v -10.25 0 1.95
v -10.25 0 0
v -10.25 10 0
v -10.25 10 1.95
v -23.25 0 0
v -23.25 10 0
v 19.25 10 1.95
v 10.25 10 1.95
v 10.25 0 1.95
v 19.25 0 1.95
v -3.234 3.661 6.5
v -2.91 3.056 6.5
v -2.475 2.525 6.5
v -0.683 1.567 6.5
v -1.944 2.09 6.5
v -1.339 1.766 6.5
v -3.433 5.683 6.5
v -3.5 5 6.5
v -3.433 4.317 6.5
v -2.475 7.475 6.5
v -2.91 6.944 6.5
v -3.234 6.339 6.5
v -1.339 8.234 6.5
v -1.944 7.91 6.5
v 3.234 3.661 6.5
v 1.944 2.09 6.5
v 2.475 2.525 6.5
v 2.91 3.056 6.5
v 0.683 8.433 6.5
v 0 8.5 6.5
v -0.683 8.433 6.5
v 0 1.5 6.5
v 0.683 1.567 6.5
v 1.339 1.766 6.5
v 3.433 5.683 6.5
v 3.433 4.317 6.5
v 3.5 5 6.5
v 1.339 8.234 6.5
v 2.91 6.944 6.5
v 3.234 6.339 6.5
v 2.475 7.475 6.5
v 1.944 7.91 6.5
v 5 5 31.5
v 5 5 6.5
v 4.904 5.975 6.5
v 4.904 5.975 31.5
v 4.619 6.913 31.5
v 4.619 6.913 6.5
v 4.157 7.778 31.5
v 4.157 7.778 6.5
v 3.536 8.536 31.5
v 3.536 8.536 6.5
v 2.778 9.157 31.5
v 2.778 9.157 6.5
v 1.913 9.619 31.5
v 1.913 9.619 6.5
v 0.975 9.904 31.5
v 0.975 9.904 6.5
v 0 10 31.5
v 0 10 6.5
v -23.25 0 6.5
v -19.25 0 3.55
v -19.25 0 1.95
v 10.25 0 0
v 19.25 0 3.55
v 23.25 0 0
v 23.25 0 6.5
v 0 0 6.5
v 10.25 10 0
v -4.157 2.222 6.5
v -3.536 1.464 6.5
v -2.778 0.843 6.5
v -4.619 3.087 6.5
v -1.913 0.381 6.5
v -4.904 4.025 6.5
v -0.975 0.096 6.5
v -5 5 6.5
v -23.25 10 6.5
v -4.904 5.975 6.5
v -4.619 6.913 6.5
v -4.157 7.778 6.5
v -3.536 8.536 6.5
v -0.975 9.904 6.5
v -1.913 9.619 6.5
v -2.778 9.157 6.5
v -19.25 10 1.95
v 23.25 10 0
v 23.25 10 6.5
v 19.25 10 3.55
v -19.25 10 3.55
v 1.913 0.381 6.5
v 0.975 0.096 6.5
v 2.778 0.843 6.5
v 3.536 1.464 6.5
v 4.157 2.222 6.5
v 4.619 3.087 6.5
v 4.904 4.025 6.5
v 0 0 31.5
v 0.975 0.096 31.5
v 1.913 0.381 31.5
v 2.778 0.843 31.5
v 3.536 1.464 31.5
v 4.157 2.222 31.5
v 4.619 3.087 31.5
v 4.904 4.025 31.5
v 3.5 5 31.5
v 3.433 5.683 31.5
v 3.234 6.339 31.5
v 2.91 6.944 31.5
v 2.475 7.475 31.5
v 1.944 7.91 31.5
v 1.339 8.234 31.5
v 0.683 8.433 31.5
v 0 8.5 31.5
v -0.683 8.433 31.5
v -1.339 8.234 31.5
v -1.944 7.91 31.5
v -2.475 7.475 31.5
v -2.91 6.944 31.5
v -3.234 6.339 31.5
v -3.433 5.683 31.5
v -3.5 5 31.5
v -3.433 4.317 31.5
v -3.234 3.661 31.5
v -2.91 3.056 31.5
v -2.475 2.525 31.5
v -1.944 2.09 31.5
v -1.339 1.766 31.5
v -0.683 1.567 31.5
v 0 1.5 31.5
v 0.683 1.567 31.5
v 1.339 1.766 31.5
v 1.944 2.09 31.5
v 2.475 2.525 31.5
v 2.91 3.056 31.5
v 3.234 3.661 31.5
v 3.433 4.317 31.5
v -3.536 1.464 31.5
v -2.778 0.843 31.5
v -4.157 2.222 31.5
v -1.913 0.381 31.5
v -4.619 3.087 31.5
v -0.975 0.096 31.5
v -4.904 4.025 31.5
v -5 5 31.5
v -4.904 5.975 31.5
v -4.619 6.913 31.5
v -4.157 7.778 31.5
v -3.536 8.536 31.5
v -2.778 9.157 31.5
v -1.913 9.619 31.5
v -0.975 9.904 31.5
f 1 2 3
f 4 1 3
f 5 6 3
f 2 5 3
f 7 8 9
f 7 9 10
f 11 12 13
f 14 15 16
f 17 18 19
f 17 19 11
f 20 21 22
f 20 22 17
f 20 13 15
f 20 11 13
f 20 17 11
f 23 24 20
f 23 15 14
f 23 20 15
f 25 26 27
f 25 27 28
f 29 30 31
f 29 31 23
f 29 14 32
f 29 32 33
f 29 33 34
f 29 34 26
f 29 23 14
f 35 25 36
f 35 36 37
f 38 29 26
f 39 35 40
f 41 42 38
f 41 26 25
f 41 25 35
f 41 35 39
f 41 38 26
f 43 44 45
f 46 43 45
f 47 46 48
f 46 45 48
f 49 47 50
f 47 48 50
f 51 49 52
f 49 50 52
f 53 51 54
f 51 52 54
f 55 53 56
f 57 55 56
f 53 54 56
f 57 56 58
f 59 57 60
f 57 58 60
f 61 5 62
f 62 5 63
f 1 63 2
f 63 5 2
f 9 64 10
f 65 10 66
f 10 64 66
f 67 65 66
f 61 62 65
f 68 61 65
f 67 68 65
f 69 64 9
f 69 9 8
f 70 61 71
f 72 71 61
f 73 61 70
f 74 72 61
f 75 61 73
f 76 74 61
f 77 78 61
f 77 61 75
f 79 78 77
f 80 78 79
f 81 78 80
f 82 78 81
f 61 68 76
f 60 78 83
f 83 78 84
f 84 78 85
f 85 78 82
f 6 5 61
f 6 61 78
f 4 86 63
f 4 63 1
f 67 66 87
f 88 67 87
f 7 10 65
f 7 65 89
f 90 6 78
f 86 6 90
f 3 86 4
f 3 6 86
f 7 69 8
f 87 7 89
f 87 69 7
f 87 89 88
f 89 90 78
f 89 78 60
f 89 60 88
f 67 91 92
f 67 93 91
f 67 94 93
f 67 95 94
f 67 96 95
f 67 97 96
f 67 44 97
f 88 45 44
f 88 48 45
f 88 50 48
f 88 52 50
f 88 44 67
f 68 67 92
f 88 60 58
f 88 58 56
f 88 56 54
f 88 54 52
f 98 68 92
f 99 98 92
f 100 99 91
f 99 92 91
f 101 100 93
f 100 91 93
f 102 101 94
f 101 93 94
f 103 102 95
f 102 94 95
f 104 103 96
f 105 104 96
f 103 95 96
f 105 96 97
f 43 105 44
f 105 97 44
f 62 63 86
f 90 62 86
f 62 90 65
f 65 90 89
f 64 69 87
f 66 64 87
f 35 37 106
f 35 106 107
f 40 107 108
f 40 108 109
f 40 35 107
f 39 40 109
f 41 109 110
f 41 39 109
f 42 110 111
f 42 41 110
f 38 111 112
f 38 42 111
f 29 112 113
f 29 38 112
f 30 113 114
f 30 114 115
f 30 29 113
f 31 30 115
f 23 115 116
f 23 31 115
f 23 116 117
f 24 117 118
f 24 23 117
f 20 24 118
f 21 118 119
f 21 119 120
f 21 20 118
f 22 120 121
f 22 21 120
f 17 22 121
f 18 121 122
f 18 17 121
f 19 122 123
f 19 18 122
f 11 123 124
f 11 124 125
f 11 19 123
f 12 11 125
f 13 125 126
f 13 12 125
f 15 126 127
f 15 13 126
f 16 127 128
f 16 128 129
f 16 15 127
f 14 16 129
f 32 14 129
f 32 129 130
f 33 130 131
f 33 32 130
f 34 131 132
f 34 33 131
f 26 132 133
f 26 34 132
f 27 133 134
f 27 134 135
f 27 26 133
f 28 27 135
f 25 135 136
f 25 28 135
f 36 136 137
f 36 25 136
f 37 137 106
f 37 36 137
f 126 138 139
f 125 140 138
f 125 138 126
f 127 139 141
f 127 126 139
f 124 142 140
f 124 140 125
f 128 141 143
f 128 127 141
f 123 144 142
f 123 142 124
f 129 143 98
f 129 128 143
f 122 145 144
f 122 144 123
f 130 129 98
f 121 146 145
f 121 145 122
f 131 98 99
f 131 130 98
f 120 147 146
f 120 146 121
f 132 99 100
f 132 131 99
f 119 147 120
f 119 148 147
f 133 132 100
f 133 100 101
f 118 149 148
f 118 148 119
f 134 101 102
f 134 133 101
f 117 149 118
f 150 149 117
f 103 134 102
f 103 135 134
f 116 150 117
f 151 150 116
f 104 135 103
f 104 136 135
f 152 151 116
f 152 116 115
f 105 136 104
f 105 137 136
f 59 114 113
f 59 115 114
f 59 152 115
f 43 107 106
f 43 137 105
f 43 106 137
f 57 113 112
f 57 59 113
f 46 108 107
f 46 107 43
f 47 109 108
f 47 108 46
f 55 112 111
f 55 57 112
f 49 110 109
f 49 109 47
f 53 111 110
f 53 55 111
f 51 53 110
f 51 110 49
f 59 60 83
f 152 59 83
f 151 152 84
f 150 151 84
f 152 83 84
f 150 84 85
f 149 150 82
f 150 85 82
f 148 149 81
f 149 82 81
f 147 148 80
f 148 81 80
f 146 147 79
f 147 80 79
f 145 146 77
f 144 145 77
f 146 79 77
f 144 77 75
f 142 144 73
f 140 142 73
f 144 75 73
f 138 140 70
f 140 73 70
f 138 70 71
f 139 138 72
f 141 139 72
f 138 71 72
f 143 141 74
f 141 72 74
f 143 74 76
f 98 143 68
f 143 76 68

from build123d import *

# Parameters (mm, degrees)
F0_W     = 4
F0_H     = 10
F0_W_2   = 9
F0_W_3   = 20.5
F1_DEPTH = 6.5
F2_DEPTH = 3.55
F3_DEPTH = 1.95
F4_R     = 3.5
F5_DEPTH = 25


with BuildPart() as f1:
    # F0 (on Top) → F1 (new body)
    with BuildSketch(Plane.XY):
        with Locations((-21.25, 5)):
            Rectangle(F0_W, F0_H)
        with Locations((-14.75, 5)):
            Rectangle(F0_W_2, F0_H)
        with Locations((0, 5)):
            Rectangle(F0_W_3, F0_H)
        with Locations((14.75, 5)):
            Rectangle(F0_W_2, F0_H)
        with Locations((21.25, 5)):
            Rectangle(F0_W, F0_H)
    extrude(amount=F1_DEPTH)

    # F0 (on Top) → F2 (cut)
    with BuildSketch(Plane.XY):
        with Locations((-14.75, 5)):
            Rectangle(F0_W_2, F0_H)
        with Locations((0, 5)):
            Rectangle(F0_W_3, F0_H)
        with Locations((14.75, 5)):
            Rectangle(F0_W_2, F0_H)
    extrude(amount=F2_DEPTH, mode=Mode.SUBTRACT)

    # F0 (on Top) → F3 (join)
    with BuildSketch(Plane.XY):
        with Locations((-14.75, 5)):
            Rectangle(F0_W_2, F0_H)
        with Locations((14.75, 5)):
            Rectangle(F0_W_2, F0_H)
    extrude(amount=F3_DEPTH)

    # F4 (on face) → F5 (join)
    with BuildSketch(Plane.XY.offset(6.5)):
        with BuildLine():
            ThreePointArc((0, 0), (3.535534, 1.464466), (5, 5))
            ThreePointArc((5, 5), (3.535534, 8.535534), (0, 10))
            ThreePointArc((0, 10), (-5, 5), (0, 0))
        make_face()
        with Locations((0, 5)):
            Circle(F4_R, mode=Mode.SUBTRACT)
    extrude(amount=F5_DEPTH)


solid = f1.part
